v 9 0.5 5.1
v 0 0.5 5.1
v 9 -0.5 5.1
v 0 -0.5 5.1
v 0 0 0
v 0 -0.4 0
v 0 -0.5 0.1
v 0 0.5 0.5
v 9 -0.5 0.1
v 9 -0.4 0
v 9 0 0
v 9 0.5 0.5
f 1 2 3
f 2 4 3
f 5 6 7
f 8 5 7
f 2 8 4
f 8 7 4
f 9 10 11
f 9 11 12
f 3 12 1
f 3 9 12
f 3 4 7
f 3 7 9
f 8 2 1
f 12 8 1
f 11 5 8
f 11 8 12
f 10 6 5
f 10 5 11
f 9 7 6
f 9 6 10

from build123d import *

# Parameters (mm, degrees)
F0_W     = 9
F0_H     = 5.1
F1_DEPTH = 0.5
F2_SIZE  = 0.5
F3_SIZE  = 0.1


with BuildPart() as f1:
    # F0 (on Front) → F1 (new body, symmetric)
    with BuildSketch(Plane.XZ):
        with Locations((4.5, 2.55)):
            Rectangle(F0_W, F0_H)
    extrude(amount=F1_DEPTH, both=True)

    # F2
    f2_edges = [f1.edges().sort_by_distance(p)[0] for p in [
        (4.5, 0.5, 0),
    ]]
    chamfer(f2_edges, length=F2_SIZE)

    # F3
    f3_edges = [f1.edges().sort_by_distance(p)[0] for p in [
        (4.5, -0.5, 0),
    ]]
    chamfer(f3_edges, length=F3_SIZE)


solid = f1.part
